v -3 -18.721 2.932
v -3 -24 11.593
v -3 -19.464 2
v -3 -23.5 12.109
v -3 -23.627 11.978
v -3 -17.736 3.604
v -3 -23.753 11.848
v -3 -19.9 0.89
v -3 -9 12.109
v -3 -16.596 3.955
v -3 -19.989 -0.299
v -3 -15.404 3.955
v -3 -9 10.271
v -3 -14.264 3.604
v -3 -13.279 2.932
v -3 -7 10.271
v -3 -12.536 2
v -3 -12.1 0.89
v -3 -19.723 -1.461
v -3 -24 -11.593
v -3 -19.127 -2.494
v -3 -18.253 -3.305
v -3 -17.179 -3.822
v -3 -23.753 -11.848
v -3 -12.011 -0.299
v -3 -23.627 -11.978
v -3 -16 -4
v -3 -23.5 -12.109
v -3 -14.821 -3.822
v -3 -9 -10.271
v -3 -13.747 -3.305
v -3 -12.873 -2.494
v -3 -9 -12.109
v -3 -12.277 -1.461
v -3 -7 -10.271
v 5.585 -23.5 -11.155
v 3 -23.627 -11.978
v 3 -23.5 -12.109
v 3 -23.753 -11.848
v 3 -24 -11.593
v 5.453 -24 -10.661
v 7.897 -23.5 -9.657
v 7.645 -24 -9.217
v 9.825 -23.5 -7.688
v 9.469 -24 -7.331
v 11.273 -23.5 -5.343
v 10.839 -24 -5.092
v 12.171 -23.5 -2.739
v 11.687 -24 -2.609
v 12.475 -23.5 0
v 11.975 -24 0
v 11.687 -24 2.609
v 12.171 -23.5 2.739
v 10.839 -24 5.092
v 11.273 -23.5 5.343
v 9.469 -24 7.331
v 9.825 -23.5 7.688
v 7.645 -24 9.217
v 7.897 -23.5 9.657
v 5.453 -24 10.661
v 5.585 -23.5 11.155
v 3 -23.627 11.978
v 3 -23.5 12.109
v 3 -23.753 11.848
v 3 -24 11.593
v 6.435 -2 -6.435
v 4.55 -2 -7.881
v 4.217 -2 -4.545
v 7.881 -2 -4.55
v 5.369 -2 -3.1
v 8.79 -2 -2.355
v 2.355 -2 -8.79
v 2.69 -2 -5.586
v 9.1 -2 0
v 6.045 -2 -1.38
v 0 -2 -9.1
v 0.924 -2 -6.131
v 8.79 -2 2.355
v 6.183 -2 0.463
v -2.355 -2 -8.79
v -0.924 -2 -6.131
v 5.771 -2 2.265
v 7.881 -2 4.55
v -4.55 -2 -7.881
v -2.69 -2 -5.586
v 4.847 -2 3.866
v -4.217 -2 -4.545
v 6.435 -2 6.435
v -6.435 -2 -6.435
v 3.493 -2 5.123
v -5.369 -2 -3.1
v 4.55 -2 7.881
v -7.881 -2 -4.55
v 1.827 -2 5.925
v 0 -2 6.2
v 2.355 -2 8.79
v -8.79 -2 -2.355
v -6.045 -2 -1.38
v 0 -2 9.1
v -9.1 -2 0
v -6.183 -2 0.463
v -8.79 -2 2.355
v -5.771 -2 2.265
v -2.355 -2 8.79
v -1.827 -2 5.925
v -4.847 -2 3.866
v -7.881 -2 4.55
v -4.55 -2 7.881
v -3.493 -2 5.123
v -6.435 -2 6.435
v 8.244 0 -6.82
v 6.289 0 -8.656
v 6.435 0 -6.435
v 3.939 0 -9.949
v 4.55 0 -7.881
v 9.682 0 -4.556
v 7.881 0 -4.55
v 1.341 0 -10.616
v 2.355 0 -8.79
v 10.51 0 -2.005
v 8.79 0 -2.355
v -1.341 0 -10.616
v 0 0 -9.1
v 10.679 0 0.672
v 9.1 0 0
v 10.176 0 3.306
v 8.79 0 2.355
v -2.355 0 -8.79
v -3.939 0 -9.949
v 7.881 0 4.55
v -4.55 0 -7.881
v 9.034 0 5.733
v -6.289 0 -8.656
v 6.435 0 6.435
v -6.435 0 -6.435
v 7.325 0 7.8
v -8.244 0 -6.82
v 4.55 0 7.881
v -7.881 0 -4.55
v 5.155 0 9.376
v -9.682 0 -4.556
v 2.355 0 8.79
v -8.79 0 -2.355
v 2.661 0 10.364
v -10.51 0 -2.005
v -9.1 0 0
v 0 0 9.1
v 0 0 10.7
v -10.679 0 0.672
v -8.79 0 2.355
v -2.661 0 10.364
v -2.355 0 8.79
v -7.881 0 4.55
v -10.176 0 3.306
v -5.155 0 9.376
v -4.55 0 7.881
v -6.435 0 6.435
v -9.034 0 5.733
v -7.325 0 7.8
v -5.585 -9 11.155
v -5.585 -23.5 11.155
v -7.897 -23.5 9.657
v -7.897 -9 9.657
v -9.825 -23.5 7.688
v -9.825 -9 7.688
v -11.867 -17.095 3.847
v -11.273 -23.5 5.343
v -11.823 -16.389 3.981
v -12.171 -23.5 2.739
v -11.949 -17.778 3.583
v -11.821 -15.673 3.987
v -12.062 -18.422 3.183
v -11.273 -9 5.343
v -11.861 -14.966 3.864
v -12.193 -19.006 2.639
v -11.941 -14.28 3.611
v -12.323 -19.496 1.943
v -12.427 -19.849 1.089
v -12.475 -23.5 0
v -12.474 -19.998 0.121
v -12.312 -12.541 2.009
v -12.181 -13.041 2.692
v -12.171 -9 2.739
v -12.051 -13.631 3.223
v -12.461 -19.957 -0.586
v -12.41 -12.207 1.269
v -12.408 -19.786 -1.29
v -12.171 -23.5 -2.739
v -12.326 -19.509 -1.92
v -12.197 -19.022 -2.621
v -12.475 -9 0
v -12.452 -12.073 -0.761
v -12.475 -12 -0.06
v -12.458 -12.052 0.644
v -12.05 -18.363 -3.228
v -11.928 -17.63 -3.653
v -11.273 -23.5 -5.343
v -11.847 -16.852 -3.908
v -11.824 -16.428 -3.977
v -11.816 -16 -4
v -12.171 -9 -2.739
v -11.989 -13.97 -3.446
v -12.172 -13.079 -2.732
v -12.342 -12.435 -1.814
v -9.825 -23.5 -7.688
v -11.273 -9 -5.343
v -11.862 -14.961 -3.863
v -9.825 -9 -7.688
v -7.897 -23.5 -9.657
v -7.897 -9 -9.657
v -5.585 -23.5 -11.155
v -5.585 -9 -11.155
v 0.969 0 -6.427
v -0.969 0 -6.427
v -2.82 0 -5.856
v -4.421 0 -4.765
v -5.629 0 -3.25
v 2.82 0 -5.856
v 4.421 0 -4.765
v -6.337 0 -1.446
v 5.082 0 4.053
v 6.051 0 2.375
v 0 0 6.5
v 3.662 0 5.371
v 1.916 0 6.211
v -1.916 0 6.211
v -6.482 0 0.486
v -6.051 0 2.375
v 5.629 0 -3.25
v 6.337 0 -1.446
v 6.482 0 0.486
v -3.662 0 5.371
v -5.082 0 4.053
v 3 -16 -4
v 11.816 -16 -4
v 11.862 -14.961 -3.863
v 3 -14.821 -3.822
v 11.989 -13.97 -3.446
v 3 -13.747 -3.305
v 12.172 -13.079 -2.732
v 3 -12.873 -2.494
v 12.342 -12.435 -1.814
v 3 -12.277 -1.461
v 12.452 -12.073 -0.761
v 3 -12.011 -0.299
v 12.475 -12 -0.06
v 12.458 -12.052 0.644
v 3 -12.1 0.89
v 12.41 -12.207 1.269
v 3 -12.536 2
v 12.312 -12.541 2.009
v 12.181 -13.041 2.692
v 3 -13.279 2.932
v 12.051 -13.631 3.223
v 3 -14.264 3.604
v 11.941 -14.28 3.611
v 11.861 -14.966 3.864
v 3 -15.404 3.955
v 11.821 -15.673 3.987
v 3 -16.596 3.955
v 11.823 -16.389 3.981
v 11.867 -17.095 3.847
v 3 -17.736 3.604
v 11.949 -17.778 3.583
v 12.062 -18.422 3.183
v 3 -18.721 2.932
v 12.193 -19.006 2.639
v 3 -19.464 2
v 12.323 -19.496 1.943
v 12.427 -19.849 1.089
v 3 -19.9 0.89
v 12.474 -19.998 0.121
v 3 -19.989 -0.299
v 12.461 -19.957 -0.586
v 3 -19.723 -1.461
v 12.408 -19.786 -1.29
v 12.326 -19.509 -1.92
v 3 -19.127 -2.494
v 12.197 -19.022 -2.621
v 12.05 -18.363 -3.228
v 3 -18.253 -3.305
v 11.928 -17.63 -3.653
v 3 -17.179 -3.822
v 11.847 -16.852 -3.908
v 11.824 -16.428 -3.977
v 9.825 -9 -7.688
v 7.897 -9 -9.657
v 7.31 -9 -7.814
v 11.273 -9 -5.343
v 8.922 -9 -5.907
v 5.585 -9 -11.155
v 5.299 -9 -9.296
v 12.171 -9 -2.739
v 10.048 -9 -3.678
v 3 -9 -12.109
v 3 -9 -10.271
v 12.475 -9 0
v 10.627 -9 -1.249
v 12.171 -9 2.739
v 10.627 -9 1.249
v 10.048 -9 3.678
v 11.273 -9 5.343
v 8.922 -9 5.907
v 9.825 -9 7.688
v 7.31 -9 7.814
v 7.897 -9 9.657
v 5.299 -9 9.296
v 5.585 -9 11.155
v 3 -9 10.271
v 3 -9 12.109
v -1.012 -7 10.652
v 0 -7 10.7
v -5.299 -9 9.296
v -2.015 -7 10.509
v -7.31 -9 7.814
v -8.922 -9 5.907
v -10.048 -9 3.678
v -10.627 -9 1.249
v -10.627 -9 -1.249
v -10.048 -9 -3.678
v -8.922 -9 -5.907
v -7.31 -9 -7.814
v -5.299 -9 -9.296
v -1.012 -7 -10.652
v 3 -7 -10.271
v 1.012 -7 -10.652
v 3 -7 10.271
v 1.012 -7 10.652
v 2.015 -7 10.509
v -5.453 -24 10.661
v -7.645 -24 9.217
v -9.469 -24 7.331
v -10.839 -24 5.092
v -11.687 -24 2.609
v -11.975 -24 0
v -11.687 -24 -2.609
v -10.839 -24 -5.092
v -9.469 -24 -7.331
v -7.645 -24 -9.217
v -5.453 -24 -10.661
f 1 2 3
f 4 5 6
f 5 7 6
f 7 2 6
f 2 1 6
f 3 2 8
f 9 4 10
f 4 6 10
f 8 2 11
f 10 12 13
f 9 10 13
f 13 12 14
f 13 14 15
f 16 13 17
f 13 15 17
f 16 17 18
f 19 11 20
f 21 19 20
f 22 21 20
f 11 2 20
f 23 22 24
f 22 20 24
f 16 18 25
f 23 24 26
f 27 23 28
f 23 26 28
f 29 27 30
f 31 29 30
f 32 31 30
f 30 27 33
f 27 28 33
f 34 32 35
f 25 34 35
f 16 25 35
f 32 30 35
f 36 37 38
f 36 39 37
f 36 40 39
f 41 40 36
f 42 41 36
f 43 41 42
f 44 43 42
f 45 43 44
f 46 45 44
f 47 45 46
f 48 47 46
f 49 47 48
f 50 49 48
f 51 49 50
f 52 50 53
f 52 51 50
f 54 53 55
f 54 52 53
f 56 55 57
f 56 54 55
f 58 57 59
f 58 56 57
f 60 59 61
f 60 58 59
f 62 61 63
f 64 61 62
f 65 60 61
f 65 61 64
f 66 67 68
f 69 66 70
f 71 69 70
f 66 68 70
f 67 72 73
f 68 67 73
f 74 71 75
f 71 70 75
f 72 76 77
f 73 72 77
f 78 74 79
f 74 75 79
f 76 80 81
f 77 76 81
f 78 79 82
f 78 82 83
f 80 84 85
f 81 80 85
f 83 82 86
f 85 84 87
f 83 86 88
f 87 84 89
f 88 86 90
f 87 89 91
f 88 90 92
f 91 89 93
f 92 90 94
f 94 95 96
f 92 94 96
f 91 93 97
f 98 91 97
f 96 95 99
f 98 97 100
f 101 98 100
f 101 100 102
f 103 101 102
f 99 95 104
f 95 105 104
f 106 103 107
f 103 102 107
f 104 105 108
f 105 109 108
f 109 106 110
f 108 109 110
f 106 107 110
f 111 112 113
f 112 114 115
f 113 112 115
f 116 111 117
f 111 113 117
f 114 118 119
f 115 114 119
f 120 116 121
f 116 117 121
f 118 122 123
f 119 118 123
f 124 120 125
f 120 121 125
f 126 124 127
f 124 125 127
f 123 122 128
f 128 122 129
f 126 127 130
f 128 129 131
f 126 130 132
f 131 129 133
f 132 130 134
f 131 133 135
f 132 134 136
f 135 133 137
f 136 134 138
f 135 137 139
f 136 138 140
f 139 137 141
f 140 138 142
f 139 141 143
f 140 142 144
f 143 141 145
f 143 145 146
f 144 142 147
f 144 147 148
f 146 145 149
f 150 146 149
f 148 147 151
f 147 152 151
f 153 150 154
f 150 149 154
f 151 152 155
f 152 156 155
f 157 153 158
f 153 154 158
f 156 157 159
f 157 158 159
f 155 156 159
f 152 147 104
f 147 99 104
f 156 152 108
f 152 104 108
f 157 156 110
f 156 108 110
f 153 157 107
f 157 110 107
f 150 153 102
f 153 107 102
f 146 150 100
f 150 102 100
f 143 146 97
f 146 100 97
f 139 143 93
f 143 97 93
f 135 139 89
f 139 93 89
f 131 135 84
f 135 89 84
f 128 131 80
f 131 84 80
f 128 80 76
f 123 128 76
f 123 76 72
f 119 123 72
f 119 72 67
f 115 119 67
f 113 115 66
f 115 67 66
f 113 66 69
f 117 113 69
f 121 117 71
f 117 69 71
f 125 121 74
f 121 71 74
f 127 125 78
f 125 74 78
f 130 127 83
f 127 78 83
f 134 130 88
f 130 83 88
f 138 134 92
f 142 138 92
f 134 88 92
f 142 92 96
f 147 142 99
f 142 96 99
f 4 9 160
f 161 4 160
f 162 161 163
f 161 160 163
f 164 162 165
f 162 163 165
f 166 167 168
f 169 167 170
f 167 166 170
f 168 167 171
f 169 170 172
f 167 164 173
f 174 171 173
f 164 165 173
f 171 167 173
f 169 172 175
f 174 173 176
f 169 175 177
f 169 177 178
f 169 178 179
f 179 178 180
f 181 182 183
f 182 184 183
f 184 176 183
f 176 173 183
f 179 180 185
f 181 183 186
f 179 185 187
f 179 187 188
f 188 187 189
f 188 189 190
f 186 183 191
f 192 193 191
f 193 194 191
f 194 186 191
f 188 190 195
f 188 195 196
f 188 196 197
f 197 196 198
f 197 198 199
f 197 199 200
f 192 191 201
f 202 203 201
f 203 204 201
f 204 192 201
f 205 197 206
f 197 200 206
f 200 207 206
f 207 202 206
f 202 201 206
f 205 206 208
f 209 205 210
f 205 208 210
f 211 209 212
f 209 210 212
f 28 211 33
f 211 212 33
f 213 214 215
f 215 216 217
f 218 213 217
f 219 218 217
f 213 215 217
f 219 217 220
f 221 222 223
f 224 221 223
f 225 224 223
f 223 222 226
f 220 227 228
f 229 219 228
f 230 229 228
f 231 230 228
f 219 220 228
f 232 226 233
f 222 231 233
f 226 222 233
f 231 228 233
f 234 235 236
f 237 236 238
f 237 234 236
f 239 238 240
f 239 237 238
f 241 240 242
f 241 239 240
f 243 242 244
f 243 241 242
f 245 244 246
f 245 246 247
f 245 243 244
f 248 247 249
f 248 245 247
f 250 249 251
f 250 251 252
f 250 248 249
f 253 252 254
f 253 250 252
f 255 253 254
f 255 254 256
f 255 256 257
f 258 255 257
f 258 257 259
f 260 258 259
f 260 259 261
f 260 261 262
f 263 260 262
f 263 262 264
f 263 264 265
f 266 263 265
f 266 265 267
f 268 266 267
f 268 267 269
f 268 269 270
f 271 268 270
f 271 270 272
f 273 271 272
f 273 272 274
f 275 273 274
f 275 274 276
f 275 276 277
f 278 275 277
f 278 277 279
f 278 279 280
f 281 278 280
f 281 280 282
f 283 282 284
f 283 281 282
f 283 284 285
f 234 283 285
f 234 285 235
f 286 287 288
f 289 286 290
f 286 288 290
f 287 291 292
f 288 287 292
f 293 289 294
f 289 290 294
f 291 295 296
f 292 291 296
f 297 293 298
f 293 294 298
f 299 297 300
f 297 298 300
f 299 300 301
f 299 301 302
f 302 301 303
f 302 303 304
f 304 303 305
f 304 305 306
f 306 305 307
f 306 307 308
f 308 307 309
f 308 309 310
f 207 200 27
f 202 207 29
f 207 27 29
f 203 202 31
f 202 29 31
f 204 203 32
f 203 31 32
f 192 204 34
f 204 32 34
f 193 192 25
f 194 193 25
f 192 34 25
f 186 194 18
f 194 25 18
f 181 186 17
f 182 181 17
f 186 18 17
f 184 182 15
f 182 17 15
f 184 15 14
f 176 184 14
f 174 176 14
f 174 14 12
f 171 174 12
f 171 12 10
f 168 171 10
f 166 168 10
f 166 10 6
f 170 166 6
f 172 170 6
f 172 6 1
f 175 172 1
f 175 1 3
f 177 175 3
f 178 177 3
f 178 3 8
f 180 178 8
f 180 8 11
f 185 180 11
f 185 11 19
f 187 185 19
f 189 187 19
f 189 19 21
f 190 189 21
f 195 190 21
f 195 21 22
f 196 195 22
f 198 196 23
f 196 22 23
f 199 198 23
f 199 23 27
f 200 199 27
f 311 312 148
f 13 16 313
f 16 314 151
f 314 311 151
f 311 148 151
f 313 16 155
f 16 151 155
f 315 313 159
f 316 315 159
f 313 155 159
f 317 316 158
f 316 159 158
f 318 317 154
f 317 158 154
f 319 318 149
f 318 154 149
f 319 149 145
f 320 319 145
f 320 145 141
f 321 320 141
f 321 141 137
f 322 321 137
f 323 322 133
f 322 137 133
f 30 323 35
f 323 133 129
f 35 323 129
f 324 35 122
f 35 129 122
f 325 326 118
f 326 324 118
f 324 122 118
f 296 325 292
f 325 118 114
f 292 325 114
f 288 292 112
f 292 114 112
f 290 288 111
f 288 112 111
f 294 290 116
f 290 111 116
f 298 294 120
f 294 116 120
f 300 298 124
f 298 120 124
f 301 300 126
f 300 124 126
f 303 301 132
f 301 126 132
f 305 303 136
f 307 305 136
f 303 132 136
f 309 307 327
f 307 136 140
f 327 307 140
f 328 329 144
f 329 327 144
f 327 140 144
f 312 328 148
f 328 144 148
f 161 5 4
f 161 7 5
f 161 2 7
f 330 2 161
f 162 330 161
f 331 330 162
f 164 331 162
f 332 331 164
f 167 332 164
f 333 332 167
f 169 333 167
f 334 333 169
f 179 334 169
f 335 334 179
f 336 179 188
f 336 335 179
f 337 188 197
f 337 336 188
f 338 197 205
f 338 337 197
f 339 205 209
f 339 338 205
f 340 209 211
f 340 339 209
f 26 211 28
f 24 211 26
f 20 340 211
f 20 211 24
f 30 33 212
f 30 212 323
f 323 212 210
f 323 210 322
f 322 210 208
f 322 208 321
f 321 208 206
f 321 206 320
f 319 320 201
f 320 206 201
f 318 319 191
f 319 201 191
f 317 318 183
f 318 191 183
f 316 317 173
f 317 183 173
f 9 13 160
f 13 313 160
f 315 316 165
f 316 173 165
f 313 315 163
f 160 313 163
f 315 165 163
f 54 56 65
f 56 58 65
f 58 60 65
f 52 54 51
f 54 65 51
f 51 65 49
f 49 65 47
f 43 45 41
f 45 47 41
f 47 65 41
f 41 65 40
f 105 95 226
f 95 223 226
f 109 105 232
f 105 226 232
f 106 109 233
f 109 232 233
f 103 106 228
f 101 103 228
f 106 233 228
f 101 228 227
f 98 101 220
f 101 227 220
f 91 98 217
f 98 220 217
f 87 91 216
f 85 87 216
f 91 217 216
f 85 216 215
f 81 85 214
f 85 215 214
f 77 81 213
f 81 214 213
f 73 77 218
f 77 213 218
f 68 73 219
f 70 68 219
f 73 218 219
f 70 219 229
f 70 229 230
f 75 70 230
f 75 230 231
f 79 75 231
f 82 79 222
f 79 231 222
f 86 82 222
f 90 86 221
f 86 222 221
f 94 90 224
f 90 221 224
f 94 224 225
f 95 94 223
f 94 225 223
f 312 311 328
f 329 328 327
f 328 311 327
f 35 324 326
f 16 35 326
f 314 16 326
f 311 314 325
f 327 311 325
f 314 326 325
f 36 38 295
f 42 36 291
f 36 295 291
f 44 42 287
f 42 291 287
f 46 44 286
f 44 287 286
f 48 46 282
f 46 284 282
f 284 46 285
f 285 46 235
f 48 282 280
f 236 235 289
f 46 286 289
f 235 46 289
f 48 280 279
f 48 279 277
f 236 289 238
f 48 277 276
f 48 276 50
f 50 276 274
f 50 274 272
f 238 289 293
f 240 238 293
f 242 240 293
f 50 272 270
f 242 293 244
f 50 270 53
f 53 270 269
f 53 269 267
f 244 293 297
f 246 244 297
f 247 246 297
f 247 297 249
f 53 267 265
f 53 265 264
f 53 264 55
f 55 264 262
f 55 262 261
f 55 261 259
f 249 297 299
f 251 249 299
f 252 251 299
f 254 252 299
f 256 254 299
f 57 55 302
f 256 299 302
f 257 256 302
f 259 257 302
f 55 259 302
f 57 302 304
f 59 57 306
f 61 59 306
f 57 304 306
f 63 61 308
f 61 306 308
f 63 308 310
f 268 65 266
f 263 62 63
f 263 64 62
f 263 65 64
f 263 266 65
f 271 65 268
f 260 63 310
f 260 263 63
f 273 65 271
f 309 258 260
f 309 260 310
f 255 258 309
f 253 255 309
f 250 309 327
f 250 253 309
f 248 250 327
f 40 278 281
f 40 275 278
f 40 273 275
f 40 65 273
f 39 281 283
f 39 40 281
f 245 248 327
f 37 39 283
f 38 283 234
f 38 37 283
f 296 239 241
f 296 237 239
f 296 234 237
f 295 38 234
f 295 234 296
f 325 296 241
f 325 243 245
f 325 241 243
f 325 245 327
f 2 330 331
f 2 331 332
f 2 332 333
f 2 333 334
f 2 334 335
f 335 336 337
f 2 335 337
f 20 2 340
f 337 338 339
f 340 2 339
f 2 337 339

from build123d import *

# Parameters (mm, degrees)
SKETCH2_W               = 6
SKETCH2_H               = 17
CUT_EXTRUDE1_DEPTH      = 13.475
CUT_EXTRUDE1_DEPTH_BACK = 13.475
SKETCH3_R               = 4
CUT_EXTRUDE2_DEPTH      = 13.475
CUT_EXTRUDE2_DEPTH_BACK = 13.475
CHAMFER1_SIZE           = 0.5


with BuildPart() as part:
    # Sketch1 → Revolve1 (revolve)
    with BuildSketch(Plane.XY, mode=Mode.PRIVATE) as revolve1_sk:
        Polygon((-9.1, 0), (-9.1, -2), (-6.2, -2), (-6.5, 0), (0, 0), (0, -24), (-12.475, -24), (-12.475, -9), (-10.7, -9), (-10.7, 0), align=None)
    revolve(revolve1_sk.sketch.rotate(Axis((0, 0, 0), (0, -1, 0)), 270), axis=Axis((0, 0, 0), (0, -1, 0)))  # turned: the seam where the file's is

    # Sketch2 → Cut-Extrude1 (cut, two sides)
    with BuildSketch(Plane.XY) as cut_extrude1_sk:
        with Locations((0, -15.5)):
            Rectangle(SKETCH2_W, SKETCH2_H)
    extrude(amount=CUT_EXTRUDE1_DEPTH, mode=Mode.SUBTRACT)
    extrude(cut_extrude1_sk.sketch, amount=-CUT_EXTRUDE1_DEPTH_BACK, mode=Mode.SUBTRACT)

    # Sketch3 → Cut-Extrude2 (cut, two sides)
    with BuildSketch(Plane(origin=(0, 0, 0), x_dir=(0, 0, -1), z_dir=(1, 0, 0))) as cut_extrude2_sk:
        with Locations((0, -16)):
            Circle(SKETCH3_R)
    extrude(amount=CUT_EXTRUDE2_DEPTH, mode=Mode.SUBTRACT)
    extrude(cut_extrude2_sk.sketch, amount=-CUT_EXTRUDE2_DEPTH_BACK, mode=Mode.SUBTRACT)

    # Chamfer1
    chamfer1_edges = [part.edges().sort_by_distance(p)[0] for p in [
        (12.475, -24, 0),
        (-12.475, -24, 0),
    ]]
    chamfer(chamfer1_edges, length=CHAMFER1_SIZE)


solid = part.part
